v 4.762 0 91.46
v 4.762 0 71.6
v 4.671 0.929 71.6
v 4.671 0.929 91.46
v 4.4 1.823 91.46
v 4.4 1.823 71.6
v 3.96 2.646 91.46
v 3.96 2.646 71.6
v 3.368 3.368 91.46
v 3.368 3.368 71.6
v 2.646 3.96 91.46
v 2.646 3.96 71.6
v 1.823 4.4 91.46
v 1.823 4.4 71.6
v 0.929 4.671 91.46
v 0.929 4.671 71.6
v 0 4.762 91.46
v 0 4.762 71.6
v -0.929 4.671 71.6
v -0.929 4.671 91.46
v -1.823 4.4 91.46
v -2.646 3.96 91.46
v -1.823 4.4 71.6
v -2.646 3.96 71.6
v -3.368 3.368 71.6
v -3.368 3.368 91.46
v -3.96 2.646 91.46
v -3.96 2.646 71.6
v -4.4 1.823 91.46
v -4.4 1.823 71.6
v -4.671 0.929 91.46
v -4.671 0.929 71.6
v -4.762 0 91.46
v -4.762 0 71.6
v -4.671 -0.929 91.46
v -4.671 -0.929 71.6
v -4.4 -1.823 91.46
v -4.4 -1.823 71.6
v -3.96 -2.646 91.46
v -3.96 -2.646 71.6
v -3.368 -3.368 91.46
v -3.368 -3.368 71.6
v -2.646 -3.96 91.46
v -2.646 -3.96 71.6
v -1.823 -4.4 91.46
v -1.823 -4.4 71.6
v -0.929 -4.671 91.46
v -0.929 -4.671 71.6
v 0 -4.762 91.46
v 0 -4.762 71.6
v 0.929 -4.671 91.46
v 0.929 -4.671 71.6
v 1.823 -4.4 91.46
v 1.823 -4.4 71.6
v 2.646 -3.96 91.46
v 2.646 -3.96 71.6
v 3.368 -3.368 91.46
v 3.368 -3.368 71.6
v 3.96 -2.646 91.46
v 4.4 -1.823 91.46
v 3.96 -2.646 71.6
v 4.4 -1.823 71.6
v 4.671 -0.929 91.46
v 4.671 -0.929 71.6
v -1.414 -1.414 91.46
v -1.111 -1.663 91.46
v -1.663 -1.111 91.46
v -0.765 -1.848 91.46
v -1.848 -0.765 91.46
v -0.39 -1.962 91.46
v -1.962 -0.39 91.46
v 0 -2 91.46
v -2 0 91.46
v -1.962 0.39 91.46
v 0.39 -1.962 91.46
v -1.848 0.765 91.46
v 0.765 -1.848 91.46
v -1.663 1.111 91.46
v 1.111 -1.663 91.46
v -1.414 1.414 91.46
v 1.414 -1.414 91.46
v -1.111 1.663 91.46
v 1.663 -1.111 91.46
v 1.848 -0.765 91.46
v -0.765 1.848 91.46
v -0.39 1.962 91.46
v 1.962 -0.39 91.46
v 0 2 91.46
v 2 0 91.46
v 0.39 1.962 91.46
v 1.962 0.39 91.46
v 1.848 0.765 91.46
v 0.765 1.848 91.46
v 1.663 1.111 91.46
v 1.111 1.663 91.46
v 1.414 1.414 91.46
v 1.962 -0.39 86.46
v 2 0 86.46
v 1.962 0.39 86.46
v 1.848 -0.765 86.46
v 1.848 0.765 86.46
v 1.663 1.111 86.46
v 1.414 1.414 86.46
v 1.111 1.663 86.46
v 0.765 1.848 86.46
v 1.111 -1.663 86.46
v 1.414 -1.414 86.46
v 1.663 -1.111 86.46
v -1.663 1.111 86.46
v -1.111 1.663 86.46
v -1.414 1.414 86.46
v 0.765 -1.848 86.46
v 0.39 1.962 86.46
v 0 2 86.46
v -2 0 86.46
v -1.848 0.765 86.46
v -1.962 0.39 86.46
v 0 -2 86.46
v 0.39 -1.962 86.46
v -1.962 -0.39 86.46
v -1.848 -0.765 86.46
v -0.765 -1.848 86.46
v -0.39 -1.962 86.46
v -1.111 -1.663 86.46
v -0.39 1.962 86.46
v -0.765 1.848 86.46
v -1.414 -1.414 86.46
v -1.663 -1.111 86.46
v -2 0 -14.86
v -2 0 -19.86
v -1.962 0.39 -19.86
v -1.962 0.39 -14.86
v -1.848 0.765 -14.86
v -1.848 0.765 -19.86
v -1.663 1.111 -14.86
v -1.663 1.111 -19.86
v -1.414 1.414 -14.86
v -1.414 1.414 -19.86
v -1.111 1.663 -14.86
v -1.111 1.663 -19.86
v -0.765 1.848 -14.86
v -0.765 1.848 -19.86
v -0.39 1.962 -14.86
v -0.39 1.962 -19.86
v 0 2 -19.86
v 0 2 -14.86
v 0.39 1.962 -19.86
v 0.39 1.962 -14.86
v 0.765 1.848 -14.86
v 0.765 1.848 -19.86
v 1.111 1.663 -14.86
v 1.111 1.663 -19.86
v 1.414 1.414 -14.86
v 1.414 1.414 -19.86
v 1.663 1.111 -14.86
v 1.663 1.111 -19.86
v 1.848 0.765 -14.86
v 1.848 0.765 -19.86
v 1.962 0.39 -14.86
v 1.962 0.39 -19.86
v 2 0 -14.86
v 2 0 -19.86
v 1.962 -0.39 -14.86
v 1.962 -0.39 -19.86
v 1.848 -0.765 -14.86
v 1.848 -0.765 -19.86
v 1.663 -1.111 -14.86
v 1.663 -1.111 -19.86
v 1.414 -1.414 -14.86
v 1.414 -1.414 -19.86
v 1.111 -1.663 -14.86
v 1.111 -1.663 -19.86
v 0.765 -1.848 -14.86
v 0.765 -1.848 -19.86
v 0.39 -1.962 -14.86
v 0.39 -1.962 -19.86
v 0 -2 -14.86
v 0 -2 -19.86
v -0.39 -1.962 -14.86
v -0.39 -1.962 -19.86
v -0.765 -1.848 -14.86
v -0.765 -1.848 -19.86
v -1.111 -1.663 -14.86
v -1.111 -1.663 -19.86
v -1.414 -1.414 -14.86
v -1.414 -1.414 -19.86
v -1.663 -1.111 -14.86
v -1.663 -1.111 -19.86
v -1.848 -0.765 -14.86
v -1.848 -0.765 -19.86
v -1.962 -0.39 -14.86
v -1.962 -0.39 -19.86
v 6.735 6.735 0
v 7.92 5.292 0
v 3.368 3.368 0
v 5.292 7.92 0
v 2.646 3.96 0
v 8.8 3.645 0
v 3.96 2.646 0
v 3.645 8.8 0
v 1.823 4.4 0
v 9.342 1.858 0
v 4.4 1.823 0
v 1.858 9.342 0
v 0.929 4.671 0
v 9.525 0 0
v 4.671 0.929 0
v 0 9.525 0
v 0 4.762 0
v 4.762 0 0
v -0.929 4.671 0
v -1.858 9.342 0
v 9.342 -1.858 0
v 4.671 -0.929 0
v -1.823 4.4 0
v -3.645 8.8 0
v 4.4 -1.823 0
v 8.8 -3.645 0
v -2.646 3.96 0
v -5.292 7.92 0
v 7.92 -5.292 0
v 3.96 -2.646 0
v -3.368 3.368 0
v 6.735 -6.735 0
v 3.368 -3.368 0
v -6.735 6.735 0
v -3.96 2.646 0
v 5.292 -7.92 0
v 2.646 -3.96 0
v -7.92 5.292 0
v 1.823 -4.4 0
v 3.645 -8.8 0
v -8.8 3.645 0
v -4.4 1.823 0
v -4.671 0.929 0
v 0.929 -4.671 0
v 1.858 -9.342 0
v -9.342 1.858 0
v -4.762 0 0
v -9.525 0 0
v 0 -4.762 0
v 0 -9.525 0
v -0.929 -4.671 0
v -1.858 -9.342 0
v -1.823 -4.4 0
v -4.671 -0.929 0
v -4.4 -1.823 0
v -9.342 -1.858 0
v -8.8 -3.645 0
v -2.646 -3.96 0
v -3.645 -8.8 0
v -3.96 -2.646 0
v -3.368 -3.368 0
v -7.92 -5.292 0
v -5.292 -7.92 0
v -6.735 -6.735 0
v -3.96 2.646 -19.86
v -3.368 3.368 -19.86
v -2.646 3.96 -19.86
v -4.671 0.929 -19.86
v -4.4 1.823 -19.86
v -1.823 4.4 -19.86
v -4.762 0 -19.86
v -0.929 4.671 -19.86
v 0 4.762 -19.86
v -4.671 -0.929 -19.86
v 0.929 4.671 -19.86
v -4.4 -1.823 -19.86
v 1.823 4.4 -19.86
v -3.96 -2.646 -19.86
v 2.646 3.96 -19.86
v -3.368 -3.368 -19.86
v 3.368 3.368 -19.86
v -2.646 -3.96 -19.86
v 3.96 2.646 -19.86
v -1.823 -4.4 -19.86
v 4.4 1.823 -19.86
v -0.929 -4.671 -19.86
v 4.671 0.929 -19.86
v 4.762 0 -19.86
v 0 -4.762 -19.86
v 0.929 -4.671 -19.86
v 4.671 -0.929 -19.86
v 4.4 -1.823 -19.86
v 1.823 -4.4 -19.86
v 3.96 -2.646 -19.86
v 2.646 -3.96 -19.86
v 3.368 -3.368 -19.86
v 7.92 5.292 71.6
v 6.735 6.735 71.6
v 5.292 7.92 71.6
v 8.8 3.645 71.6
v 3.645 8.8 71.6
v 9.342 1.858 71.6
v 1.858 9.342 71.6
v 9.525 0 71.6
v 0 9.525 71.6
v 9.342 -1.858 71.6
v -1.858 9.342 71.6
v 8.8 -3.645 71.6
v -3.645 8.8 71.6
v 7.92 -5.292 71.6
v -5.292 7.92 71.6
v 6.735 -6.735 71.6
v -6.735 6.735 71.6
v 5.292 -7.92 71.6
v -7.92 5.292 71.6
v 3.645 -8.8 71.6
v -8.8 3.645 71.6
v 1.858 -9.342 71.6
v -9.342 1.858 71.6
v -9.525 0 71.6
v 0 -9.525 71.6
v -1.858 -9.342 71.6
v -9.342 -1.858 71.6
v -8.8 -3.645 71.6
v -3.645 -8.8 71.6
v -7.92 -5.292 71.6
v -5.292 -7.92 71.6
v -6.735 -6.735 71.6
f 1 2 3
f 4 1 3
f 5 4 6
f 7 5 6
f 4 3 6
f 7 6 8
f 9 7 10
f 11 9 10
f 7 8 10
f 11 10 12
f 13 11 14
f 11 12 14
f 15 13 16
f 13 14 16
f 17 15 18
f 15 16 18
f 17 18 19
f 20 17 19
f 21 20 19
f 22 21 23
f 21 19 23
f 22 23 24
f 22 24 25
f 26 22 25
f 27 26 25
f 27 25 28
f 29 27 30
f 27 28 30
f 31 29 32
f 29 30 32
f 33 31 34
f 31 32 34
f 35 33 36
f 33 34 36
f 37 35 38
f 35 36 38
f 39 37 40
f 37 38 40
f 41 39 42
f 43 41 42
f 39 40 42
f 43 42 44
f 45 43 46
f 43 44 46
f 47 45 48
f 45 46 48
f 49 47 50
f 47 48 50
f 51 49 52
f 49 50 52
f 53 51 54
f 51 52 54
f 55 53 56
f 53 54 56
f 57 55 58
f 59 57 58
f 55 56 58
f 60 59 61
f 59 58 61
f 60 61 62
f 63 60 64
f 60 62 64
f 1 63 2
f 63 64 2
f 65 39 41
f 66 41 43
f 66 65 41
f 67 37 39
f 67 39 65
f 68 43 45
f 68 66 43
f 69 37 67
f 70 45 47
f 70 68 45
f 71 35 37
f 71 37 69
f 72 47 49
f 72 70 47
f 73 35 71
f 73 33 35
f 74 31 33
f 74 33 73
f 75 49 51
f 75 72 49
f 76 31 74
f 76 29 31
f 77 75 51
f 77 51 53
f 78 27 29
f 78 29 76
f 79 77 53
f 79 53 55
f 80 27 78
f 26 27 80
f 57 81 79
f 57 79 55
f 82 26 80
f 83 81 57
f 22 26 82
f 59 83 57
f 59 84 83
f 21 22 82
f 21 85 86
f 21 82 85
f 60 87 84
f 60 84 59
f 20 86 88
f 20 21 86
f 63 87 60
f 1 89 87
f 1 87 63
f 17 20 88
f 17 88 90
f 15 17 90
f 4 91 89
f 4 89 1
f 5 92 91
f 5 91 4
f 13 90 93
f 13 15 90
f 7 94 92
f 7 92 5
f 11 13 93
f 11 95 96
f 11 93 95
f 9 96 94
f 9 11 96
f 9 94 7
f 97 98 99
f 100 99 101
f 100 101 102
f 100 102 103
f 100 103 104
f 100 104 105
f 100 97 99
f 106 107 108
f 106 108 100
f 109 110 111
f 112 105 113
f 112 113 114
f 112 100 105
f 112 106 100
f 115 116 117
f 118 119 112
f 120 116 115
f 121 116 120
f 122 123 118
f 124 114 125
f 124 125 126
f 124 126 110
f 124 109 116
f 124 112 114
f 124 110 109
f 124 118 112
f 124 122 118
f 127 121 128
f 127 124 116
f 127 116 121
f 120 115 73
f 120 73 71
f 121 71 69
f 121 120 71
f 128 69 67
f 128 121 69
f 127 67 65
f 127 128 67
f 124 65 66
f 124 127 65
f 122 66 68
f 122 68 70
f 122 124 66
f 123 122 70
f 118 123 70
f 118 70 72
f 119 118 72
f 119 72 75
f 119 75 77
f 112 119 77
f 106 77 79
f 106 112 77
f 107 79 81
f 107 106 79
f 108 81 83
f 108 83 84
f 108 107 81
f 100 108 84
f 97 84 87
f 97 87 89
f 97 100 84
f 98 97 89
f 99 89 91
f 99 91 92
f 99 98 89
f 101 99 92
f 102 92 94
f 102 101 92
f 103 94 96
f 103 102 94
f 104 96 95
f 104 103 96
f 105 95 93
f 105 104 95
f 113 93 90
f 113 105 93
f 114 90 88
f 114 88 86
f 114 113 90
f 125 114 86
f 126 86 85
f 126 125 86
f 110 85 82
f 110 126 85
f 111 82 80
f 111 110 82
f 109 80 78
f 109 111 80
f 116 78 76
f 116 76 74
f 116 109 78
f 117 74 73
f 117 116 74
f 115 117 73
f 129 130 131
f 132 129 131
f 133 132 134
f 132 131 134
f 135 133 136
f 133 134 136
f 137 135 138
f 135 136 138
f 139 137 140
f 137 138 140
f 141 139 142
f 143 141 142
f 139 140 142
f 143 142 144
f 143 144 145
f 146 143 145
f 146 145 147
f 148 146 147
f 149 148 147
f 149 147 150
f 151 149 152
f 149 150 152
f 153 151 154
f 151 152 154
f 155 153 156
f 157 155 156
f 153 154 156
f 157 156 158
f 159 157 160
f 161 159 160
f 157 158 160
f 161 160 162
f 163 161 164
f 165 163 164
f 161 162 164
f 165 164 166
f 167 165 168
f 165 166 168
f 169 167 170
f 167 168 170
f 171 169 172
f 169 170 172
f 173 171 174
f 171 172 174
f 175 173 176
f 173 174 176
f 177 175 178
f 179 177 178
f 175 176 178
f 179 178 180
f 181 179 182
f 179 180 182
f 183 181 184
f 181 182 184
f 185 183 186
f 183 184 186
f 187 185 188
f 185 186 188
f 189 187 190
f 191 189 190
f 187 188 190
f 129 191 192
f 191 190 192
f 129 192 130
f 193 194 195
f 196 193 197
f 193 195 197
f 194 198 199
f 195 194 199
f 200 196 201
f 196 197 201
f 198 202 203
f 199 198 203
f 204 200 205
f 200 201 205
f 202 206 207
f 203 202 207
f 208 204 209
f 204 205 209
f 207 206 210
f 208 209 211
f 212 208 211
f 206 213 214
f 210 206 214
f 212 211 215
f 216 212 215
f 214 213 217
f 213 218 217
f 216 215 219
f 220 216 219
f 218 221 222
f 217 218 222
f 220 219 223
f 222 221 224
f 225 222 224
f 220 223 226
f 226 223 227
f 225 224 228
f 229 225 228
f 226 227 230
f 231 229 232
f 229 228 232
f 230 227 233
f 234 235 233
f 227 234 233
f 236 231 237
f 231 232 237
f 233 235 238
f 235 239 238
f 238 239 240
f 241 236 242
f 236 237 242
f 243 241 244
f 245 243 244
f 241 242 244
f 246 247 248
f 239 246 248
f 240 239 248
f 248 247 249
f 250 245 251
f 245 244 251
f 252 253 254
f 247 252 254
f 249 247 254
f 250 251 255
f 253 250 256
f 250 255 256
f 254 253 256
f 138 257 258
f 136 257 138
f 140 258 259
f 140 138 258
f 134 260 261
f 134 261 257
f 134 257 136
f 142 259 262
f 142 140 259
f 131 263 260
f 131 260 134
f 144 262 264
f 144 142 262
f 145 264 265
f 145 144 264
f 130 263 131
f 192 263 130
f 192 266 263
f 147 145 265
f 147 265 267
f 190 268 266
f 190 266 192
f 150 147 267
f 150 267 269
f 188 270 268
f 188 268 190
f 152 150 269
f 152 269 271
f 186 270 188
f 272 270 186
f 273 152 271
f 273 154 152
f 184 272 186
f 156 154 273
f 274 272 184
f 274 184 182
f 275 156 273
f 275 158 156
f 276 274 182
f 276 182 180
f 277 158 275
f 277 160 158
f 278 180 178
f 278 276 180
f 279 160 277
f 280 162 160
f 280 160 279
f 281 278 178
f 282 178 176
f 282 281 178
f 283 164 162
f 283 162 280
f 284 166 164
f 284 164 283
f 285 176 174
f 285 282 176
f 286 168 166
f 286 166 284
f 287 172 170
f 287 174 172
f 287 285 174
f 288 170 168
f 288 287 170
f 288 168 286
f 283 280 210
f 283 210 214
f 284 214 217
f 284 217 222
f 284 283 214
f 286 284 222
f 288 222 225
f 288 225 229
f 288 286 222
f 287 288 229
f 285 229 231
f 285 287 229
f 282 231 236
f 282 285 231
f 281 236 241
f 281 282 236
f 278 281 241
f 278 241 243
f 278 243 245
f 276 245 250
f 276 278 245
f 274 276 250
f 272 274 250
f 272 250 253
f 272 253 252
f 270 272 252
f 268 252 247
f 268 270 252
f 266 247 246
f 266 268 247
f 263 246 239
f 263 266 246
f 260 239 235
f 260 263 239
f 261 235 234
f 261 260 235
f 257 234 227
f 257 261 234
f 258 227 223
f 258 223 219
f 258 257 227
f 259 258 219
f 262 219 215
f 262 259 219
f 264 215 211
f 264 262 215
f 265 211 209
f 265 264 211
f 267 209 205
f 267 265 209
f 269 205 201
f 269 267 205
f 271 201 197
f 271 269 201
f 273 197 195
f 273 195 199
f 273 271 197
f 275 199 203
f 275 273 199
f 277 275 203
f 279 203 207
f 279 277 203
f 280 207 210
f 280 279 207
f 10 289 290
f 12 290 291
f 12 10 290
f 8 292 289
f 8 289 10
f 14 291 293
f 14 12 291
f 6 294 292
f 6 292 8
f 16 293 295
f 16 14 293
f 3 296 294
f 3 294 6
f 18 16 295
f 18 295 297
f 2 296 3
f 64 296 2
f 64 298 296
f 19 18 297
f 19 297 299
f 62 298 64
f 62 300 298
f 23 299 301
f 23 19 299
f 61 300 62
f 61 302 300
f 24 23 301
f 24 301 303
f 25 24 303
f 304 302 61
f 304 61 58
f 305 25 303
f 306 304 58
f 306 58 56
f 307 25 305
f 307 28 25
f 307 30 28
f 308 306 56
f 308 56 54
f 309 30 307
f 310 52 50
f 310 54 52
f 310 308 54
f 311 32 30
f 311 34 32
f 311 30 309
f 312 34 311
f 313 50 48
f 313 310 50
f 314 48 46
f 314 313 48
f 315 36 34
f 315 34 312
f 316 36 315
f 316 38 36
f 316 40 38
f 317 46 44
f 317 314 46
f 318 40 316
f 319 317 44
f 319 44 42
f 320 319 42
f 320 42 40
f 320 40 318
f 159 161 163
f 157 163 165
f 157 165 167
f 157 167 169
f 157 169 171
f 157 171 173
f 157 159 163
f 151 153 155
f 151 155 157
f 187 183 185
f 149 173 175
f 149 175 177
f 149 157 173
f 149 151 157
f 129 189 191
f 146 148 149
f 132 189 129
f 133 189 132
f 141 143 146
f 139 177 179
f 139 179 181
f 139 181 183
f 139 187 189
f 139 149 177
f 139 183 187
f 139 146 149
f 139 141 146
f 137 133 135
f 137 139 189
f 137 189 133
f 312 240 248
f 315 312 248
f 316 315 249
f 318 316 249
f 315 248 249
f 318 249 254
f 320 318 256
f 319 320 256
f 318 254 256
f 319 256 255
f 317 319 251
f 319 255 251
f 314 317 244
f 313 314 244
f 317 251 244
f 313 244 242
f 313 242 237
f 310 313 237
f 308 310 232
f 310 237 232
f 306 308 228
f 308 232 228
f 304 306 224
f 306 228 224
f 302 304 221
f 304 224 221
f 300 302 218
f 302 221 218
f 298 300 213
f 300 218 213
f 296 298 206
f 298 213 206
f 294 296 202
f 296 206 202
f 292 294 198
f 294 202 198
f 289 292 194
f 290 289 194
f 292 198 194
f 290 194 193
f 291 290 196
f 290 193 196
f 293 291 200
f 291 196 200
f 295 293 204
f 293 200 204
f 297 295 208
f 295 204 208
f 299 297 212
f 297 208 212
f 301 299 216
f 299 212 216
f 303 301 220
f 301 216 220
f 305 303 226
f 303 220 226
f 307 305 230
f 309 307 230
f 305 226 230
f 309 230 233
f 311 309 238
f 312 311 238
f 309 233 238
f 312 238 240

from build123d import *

# Parameters (mm, degrees)
CROQUIS1_R              = 9.525
SALIENTE_EXTRUIR1_DEPTH = 71.6
CROQUIS2_R              = 4.7625
SALIENTE_EXTRUIR2_DEPTH = 19.86
SALIENTE_EXTRUIR3_START = 19.86
CROQUIS3_R              = 4.7625
SALIENTE_EXTRUIR3_DEPTH = 19.86
CROQUIS4_R              = 2
CORTAR_EXTRUIR1_DEPTH   = 5
CORTAR_EXTRUIR2_START   = -5
CROQUIS5_R              = 2
CORTAR_EXTRUIR2_DEPTH   = 5


with BuildPart() as part:
    # Croquis1 → Saliente-Extruir1 (new body)
    with BuildSketch(Plane.XY):
        with Locations(Location((0, 0, 0), (0, 0, 180))):
            Circle(CROQUIS1_R)
    extrude(amount=SALIENTE_EXTRUIR1_DEPTH)

    # Croquis2 → Saliente-Extruir2 (add)
    with BuildSketch(Plane.XY.offset(71.6)):
        Circle(CROQUIS2_R)
    extrude(amount=SALIENTE_EXTRUIR2_DEPTH)

    # Croquis3 → Saliente-Extruir3 (add)
    with BuildSketch(Plane(origin=(0, 0, 0), x_dir=(-1, 0, 0), z_dir=(0, 0, -1)).offset(SALIENTE_EXTRUIR3_START)):
        with Locations(Location((0, 0, 0), (0, 0, 180))):
            Circle(CROQUIS3_R)
    extrude(amount=-SALIENTE_EXTRUIR3_DEPTH)

    # Croquis4 → Cortar-Extruir1 (cut)
    with BuildSketch(Plane(origin=(0, 0, -19.86), x_dir=(-1, 0, 0), z_dir=(0, 0, -1))):
        Circle(CROQUIS4_R)
    extrude(amount=-CORTAR_EXTRUIR1_DEPTH, mode=Mode.SUBTRACT)

    # Croquis5 → Cortar-Extruir2 (cut)
    with BuildSketch(Plane.XY.offset(91.46).offset(CORTAR_EXTRUIR2_START)):
        with Locations(Location((0, 0, 0), (0, 0, 180))):
            Circle(CROQUIS5_R)
    extrude(amount=CORTAR_EXTRUIR2_DEPTH, mode=Mode.SUBTRACT)


solid = part.part
